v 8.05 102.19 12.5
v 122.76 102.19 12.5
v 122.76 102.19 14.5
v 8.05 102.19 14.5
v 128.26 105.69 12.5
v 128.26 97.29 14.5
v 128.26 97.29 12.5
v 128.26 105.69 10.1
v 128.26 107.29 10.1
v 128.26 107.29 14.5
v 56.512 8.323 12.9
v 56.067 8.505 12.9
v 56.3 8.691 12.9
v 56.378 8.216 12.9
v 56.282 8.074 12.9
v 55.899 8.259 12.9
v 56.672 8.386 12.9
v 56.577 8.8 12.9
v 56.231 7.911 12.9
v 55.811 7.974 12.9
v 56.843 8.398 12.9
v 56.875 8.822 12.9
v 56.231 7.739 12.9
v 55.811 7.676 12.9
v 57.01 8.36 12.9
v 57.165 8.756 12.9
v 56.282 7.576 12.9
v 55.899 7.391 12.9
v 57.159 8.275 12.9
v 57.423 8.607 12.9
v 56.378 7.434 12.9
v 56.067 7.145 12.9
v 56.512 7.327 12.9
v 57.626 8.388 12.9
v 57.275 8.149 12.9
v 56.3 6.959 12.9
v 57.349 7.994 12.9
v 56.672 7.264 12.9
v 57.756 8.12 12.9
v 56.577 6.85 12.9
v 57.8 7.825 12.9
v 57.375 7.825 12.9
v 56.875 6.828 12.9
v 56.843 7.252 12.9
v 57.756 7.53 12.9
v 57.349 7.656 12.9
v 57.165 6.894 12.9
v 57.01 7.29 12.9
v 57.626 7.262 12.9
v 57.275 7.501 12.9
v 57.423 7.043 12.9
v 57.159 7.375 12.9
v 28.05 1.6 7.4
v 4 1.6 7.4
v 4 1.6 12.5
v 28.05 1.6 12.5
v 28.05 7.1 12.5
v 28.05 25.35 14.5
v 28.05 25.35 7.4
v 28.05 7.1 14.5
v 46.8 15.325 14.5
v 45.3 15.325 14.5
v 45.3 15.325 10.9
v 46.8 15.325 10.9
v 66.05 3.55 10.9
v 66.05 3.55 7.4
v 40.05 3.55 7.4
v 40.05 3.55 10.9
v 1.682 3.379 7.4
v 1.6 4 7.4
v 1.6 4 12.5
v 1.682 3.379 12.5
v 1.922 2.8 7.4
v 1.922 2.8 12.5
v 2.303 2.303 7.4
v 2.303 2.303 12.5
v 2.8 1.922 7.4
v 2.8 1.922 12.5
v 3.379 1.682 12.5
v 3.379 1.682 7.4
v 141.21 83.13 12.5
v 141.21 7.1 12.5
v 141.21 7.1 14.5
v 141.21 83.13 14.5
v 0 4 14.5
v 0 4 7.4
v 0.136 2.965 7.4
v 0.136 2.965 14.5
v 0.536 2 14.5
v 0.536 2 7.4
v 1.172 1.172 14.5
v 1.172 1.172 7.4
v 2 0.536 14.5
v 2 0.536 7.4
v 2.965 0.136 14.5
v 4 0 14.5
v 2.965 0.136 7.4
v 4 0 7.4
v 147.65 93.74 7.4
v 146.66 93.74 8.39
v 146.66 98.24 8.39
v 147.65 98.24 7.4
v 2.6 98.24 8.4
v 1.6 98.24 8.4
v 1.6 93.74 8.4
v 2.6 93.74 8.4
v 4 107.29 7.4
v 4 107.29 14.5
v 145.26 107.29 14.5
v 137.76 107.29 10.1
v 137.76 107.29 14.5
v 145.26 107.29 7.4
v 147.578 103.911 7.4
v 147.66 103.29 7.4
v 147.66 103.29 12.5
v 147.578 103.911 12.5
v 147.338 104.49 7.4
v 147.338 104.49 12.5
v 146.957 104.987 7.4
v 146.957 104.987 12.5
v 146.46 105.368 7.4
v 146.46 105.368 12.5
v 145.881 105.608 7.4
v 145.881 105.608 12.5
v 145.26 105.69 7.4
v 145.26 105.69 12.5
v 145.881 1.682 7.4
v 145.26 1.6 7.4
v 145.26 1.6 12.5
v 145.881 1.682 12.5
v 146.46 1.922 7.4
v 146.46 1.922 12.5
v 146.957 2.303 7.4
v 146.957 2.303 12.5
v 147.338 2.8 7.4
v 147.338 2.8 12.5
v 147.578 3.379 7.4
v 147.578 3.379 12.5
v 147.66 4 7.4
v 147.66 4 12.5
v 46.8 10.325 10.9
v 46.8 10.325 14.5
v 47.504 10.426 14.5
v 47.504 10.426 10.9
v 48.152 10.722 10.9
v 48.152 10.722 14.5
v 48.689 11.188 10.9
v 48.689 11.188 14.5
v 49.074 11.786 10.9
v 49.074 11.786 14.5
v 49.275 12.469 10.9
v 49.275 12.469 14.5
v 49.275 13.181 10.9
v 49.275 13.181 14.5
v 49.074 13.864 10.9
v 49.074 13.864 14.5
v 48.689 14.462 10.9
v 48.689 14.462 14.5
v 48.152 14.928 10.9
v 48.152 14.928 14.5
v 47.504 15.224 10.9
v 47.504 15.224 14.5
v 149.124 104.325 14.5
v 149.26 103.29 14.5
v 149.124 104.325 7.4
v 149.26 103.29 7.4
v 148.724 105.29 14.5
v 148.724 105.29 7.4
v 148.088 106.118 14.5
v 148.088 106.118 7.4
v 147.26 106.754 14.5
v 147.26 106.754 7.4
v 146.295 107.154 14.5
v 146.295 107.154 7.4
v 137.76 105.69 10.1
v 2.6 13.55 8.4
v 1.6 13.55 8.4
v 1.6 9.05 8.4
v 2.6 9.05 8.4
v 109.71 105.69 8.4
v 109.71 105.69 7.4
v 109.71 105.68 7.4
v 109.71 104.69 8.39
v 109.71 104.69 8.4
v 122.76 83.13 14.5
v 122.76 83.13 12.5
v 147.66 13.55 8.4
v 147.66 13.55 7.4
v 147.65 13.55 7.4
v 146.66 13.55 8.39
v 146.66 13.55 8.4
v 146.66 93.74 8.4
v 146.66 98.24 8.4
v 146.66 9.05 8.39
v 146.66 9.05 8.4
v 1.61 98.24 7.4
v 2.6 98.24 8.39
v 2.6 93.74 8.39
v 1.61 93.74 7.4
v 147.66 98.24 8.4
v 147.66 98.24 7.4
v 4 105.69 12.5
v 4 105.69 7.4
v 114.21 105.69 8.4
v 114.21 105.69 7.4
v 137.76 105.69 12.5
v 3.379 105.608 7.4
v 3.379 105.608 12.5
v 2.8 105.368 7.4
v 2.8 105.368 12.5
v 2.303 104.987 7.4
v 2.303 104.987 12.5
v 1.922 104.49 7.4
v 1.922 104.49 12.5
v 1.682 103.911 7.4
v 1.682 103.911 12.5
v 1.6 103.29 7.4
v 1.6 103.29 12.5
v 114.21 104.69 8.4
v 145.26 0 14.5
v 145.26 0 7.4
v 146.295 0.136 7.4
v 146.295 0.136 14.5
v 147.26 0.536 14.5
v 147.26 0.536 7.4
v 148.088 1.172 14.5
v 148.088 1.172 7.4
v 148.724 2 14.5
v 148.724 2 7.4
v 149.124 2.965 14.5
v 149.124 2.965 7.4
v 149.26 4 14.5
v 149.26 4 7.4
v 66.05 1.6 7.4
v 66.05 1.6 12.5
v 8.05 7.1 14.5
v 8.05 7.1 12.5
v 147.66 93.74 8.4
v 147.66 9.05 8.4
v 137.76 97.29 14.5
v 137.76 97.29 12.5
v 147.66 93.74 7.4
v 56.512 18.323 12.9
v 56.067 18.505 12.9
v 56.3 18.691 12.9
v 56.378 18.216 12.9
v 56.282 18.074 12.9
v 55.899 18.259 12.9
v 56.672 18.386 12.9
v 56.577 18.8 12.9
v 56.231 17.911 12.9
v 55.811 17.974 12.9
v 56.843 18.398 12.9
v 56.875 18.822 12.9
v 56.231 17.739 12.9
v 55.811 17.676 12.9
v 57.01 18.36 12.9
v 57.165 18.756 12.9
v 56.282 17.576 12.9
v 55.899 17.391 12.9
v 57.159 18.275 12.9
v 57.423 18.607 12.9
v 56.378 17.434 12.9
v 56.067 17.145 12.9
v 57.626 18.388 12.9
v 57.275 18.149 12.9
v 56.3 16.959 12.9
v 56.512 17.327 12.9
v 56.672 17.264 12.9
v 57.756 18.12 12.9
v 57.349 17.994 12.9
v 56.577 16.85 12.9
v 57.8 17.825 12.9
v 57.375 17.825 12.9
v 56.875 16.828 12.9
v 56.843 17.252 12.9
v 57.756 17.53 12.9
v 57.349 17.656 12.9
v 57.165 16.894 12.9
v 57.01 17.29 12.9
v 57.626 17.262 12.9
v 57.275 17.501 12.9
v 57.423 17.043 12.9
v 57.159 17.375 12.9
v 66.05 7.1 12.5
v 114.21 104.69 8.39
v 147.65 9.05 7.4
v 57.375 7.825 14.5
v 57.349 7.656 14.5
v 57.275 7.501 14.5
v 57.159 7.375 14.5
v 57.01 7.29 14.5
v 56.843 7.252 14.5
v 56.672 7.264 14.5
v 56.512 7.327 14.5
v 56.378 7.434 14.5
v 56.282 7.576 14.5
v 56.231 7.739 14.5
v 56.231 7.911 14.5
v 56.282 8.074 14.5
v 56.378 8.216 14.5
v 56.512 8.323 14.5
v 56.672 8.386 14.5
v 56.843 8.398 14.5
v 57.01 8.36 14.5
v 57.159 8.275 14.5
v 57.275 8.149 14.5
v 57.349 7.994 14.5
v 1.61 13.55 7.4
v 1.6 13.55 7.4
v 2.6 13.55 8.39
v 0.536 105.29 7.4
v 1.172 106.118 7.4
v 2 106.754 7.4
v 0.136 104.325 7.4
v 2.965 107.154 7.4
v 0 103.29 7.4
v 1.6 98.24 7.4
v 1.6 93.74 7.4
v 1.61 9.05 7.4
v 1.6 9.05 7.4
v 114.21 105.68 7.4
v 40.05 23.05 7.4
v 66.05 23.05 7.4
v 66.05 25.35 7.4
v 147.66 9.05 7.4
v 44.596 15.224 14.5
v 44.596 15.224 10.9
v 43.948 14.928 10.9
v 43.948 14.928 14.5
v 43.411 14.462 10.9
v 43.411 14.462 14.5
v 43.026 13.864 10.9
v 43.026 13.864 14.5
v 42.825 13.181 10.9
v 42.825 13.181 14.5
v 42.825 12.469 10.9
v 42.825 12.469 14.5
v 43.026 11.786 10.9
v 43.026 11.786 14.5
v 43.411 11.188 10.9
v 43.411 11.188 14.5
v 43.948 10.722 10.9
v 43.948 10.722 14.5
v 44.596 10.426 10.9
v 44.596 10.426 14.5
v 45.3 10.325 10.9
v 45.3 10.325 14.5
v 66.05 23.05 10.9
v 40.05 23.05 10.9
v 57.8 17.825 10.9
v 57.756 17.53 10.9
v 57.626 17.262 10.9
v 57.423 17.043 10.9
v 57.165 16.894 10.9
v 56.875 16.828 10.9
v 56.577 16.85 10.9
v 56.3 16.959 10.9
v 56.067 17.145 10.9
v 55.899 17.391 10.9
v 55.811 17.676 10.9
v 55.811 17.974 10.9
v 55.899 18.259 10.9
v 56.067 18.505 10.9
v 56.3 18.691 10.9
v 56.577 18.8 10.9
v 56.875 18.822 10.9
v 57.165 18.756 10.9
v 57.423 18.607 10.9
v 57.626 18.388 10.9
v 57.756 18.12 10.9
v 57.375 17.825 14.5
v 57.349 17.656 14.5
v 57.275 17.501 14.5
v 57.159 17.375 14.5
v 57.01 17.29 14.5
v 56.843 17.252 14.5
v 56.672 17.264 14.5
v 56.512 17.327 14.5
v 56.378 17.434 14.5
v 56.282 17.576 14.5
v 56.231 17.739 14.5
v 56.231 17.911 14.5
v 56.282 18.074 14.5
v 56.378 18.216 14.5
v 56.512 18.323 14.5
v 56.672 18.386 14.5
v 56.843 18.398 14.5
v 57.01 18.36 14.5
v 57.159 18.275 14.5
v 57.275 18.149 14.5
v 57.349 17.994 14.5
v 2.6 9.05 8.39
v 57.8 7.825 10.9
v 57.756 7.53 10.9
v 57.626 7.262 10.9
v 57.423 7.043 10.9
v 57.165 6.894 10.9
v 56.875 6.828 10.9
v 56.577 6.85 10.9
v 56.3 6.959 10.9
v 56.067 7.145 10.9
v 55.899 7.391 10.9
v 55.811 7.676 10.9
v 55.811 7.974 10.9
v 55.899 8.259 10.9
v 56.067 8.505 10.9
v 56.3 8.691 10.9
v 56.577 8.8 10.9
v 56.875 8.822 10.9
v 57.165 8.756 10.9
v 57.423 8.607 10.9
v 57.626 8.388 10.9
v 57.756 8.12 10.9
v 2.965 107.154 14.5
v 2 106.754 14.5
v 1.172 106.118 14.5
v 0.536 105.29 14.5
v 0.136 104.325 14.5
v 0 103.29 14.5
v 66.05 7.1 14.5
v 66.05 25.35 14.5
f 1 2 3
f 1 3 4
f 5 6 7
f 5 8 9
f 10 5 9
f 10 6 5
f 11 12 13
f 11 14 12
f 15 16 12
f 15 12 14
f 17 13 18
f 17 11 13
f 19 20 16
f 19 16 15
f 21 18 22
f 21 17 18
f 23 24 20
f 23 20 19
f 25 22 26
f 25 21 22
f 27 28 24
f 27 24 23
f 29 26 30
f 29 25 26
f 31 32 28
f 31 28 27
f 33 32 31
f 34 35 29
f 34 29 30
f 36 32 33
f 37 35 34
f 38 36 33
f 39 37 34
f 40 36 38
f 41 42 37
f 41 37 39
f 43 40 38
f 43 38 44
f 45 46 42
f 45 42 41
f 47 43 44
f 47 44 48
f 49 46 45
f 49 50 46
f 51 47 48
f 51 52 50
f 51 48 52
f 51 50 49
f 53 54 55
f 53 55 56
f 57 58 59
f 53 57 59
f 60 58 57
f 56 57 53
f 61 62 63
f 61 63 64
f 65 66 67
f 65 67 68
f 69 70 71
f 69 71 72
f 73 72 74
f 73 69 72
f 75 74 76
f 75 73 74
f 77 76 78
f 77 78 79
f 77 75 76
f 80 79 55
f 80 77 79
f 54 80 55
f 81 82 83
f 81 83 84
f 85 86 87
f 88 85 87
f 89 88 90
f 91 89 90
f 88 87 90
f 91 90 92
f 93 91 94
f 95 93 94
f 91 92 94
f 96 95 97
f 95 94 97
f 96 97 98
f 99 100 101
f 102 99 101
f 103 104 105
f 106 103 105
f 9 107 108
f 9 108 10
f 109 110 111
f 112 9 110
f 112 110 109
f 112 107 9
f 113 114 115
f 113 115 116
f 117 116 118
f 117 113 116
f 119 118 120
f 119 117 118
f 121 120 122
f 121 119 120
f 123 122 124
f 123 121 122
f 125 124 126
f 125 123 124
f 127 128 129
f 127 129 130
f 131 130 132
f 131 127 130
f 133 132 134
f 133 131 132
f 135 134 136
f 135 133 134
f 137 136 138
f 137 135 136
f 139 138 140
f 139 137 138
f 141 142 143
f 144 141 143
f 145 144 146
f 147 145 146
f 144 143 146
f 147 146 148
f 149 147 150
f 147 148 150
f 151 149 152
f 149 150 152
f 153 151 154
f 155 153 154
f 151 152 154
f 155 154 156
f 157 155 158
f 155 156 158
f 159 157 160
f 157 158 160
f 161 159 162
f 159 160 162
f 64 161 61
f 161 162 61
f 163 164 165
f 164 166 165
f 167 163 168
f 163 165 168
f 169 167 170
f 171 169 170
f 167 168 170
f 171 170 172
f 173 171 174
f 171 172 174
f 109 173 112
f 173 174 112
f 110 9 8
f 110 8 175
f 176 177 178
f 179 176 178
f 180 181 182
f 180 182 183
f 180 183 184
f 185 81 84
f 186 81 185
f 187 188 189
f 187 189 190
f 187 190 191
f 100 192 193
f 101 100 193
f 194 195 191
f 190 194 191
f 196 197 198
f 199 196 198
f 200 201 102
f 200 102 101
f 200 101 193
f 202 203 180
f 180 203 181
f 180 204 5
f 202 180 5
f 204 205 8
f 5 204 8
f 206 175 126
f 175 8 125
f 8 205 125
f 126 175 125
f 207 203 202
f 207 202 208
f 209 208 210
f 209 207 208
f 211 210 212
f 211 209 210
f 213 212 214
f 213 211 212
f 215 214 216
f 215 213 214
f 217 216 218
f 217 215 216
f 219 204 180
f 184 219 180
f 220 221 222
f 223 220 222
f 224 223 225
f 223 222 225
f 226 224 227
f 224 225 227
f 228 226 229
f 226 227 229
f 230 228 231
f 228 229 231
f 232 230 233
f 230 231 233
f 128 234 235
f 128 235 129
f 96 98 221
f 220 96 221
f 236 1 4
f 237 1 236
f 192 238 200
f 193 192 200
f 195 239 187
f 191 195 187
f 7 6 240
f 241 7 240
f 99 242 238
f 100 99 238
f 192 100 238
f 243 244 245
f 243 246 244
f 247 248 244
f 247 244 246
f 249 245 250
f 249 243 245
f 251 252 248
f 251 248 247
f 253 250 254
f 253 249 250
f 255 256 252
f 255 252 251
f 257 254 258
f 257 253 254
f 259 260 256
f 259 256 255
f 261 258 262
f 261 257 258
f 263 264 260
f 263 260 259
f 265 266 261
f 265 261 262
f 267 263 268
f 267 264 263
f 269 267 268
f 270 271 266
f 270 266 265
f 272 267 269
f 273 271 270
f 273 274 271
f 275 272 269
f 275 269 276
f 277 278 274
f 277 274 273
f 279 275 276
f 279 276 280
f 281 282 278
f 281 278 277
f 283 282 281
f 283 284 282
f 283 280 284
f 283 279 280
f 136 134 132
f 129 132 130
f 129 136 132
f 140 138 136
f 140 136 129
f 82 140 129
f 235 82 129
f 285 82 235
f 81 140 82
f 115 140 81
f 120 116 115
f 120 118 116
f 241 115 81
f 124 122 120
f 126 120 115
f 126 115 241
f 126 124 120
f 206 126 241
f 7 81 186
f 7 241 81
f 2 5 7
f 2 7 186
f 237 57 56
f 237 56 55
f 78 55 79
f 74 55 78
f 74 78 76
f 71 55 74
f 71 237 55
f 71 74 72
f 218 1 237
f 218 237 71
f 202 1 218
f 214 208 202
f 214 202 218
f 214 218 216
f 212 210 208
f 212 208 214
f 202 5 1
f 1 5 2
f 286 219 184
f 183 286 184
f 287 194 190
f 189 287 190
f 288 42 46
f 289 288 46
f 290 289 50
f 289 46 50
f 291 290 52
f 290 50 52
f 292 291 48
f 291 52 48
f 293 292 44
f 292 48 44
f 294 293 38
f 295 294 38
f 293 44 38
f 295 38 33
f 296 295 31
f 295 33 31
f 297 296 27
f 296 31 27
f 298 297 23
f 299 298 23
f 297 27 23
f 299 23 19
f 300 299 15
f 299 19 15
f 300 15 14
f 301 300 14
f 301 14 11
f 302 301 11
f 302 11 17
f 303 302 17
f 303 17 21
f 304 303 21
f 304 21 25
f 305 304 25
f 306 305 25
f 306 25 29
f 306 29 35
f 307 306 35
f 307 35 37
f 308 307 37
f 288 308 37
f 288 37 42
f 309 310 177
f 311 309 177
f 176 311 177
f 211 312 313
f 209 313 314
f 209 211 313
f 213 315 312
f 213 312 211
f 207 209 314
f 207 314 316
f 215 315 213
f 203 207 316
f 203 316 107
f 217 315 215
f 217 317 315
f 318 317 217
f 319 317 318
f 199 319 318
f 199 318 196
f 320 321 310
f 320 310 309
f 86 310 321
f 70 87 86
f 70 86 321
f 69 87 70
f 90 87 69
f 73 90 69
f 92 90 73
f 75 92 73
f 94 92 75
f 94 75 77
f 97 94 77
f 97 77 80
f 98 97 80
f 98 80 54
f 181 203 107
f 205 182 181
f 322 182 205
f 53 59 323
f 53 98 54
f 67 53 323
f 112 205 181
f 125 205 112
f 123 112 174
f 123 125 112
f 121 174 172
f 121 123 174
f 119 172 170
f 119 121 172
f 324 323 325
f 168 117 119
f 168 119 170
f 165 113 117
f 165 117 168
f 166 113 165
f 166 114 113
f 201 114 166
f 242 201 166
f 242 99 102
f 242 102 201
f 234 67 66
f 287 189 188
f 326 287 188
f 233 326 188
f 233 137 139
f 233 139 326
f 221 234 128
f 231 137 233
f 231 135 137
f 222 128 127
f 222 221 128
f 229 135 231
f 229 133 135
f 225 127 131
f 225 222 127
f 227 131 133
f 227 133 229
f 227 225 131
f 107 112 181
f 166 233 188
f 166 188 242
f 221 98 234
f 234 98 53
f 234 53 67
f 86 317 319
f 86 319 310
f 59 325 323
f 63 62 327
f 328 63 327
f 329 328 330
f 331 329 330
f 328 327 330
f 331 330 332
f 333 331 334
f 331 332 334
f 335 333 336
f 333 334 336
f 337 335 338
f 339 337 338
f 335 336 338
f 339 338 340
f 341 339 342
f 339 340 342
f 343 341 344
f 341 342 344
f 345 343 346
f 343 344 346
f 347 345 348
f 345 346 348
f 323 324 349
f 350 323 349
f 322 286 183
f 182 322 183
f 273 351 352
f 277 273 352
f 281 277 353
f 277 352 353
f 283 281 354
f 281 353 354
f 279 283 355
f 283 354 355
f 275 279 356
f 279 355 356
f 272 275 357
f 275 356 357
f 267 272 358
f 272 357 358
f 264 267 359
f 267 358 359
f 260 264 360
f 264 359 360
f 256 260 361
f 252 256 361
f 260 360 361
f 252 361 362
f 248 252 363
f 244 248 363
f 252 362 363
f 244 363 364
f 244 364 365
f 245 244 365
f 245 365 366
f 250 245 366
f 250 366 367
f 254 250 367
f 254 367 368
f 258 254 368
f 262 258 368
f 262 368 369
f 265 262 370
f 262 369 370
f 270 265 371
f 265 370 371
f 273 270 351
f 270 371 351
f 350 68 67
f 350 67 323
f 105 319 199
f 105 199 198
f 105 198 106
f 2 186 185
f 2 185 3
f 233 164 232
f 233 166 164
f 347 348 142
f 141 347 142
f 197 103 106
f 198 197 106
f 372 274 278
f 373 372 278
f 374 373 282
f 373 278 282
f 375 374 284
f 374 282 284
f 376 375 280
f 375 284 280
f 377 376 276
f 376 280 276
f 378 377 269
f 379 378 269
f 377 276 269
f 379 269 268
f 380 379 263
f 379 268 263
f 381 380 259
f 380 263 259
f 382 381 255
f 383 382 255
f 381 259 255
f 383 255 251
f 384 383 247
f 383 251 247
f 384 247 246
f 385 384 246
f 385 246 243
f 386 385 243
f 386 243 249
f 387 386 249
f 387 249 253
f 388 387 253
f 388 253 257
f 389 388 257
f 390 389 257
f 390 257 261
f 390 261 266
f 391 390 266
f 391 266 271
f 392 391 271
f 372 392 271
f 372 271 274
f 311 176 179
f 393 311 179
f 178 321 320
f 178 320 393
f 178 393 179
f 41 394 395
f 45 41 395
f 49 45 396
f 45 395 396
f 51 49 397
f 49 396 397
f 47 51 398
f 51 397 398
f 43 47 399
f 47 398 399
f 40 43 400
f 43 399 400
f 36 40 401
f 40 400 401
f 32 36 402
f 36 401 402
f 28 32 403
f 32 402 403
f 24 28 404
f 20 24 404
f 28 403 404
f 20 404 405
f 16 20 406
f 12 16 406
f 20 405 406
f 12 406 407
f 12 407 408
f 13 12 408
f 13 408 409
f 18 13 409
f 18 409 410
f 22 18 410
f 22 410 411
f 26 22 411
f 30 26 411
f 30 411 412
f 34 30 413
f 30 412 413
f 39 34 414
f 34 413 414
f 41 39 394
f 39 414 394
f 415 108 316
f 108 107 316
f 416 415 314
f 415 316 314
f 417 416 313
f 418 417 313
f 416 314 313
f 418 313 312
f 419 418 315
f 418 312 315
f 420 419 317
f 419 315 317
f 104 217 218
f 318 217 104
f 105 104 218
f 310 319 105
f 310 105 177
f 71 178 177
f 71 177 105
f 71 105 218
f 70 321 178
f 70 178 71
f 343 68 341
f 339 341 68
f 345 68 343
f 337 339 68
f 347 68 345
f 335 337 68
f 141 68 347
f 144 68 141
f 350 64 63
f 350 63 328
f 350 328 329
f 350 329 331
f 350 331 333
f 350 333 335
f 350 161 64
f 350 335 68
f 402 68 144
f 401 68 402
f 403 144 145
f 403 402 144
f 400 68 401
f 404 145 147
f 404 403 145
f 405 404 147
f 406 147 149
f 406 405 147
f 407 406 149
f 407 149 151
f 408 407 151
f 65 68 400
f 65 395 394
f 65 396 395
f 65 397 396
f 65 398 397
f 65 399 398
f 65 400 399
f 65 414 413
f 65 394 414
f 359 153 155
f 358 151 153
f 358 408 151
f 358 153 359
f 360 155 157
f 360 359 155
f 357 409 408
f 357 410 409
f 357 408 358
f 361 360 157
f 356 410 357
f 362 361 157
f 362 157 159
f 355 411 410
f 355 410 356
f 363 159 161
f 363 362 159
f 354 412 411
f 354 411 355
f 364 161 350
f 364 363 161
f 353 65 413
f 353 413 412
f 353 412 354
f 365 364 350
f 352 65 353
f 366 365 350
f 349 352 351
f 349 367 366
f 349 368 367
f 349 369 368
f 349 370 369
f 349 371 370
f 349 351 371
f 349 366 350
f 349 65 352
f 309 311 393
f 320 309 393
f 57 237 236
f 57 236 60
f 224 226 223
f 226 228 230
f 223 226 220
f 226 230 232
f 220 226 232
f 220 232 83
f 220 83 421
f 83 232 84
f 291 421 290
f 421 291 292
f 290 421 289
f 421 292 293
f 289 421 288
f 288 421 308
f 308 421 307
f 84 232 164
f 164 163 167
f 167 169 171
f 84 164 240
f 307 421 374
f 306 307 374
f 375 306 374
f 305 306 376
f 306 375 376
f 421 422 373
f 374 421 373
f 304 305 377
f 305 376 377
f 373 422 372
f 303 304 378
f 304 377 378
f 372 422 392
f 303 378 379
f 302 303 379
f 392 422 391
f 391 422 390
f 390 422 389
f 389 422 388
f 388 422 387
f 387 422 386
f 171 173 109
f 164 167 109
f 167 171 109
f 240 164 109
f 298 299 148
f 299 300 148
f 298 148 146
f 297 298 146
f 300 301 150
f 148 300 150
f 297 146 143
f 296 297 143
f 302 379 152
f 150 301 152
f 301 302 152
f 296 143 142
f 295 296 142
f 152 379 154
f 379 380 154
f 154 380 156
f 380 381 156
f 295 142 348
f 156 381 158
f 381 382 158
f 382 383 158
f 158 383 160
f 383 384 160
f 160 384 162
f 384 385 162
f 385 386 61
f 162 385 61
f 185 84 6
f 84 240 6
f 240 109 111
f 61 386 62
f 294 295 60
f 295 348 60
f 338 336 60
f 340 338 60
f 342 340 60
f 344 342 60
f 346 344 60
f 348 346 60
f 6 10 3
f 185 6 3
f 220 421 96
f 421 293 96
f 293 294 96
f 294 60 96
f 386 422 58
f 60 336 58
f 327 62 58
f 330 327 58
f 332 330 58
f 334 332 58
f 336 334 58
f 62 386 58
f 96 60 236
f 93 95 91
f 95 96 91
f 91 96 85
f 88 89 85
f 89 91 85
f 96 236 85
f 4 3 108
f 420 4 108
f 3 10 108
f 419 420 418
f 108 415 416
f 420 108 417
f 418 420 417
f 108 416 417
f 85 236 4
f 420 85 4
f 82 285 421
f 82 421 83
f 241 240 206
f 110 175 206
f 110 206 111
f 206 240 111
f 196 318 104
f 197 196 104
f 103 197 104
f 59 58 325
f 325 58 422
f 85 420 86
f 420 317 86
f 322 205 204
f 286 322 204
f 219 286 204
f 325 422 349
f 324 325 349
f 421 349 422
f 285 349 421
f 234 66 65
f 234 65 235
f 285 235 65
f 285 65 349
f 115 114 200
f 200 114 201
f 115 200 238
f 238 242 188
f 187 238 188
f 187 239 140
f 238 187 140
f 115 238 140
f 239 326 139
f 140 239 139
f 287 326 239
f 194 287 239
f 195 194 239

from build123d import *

# Parameters (mm, degrees)
PAD006_DEPTH    = 5.1
PAD007_DEPTH    = 2
SKETCH012_W     = 19.5
SKETCH012_H     = 3.5
POCKET004_DEPTH = 26
POCKET005_DEPTH = 5
SKETCH014_R     = 0.575
POCKET006_DEPTH = 3.6
SKETCH015_R     = 1
POCKET007_DEPTH = 2
SKETCH016_W     = 4.5
SKETCH016_H     = 1
PAD008_DEPTH    = 1
CHAMFER_SIZE    = 0.99
SKETCH017_W     = 4.5
SKETCH017_H     = 1
PAD009_DEPTH    = 1
CHAMFER001_SIZE = 0.99
SKETCH018_W     = 9.5
SKETCH018_H     = 10
POCKET008_DEPTH = 4.4
SKETCH022_W     = 4.5
SKETCH022_H     = 1
PAD011_DEPTH    = 1
CHAMFER002_SIZE = 0.99
SKETCH023_W     = 10
SKETCH023_H     = 23.75
PAD012_DEPTH    = 5.1


with BuildPart() as part:
    # Sketch010 → Pad006 (new body)
    with BuildSketch(Plane.XY.offset(7.4)):
        with BuildLine():
            Line((149.259997, 103.29), (149.259997, 4))
            ThreePointArc((145.259999, 0), (148.088425, 1.171573), (149.259997, 4))
            Line((3.999999, 0), (145.259999, 0))
            ThreePointArc((0, 4), (1.171572, 1.171573), (3.999999, 0))
            Line((0, 103.29), (0, 4))
            ThreePointArc((3.999997, 107.29), (1.171572, 106.118426), (0, 103.29))
            Line((3.999997, 107.29), (145.259997, 107.29))
            ThreePointArc((149.259997, 103.29), (148.088425, 106.118427), (145.259997, 107.29))
        make_face()
        with BuildLine():
            Line((3.999997, 105.69), (145.259997, 105.69))
            ThreePointArc((147.659997, 103.29), (146.957054, 104.987056), (145.259997, 105.69))
            Line((147.659997, 103.29), (147.659997, 4))
            ThreePointArc((145.259999, 1.6), (146.957054, 2.302944), (147.659997, 4))
            Line((66.05, 1.6), (145.259999, 1.6))
            Line((66.05, 1.6), (66.05, 25.35))
            Line((66.05, 25.35), (38.05, 25.35))
            Line((38.05, 25.35), (38.05, 1.6))
            Line((4, 1.6), (38.05, 1.6))
            ThreePointArc((1.6, 4), (2.302944, 2.302944), (4, 1.6))
            Line((1.6, 103.29), (1.6, 4))
            ThreePointArc((3.999997, 105.69), (2.302943, 104.987055), (1.6, 103.29))
        make_face(mode=Mode.SUBTRACT)
    extrude(amount=PAD006_DEPTH)

    # Sketch011 (on Face22 of Pad006) → Pad007 (join)
    with BuildSketch(Plane.XY.offset(12.5)):
        with BuildLine():
            Line((149.259997, 103.29), (149.259997, 4))
            ThreePointArc((145.259999, 0), (148.088425, 1.171573), (149.259997, 4))
            Line((3.999999, 0), (145.259999, 0))
            ThreePointArc((0, 4), (1.171572, 1.171573), (3.999999, 0))
            Line((0, 103.29), (0, 4))
            ThreePointArc((3.999997, 107.29), (1.171572, 106.118426), (0, 103.29))
            Line((3.999997, 107.29), (145.259997, 107.29))
            ThreePointArc((149.259997, 103.29), (148.088425, 106.118427), (145.259997, 107.29))
        make_face()
        Polygon((8.05, 102.19), (8.05, 7.1), (28.05, 7.1), (28.05, 25.35), (66.05, 25.35), (66.05, 7.1), (141.209997, 7.1), (141.209997, 83.13), (122.759997, 83.13), (122.759997, 102.19), align=None, mode=Mode.SUBTRACT)
    extrude(amount=PAD007_DEPTH)

    # Sketch012 (on Face26 of Pad007) → Pocket004 (cut)
    with BuildSketch(Plane.YZ.offset(66.05)):
        with Locations((13.3, 9.15)):
            Rectangle(SKETCH012_W, SKETCH012_H)
    extrude(amount=-POCKET004_DEPTH, mode=Mode.SUBTRACT)

    # Sketch013 (on Face25 of Pocket004) → Pocket005 (cut)
    with BuildSketch(Plane.XY.offset(14.5)):
        with BuildLine():
            ThreePointArc((45.3, 15.325), (42.8, 12.825), (45.3, 10.325))
            Line((45.3, 10.325), (46.8, 10.325))
            ThreePointArc((46.8, 10.325), (49.3, 12.825), (46.8, 15.325))
            Line((45.3, 15.325), (46.8, 15.325))
        make_face()
    extrude(amount=-POCKET005_DEPTH, mode=Mode.SUBTRACT)

    # Sketch014 (on Face29 of Pocket005) → Pocket006 (cut)
    with BuildSketch(Plane(origin=(0, 0, 10.9), x_dir=(1, 0, 0), z_dir=(0, 0, -1))):
        with Locations((56.8, -7.825)):
            Circle(SKETCH014_R)
        with Locations((56.8, -17.825)):
            Circle(SKETCH014_R)
    extrude(amount=-POCKET006_DEPTH, mode=Mode.SUBTRACT)

    # Sketch015 (on Face29 of Pocket006) → Pocket007 (cut)
    with BuildSketch(Plane(origin=(0, 0, 10.9), x_dir=(1, 0, 0), z_dir=(0, 0, -1))):
        with Locations((56.8, -17.825)):
            Circle(SKETCH015_R)
        with Locations((56.8, -7.825)):
            Circle(SKETCH015_R)
    extrude(amount=-POCKET007_DEPTH, mode=Mode.SUBTRACT)

    # Sketch016 (on Face6 of Pocket007) → Pad008 (join)
    with BuildSketch(Plane.YZ.offset(147.659997)):
        with Locations((11.3, 7.9)):
            Rectangle(SKETCH016_W, SKETCH016_H)
        with Locations((95.99, 7.9)):
            Rectangle(SKETCH016_W, SKETCH016_H)
    extrude(amount=-PAD008_DEPTH)

    # Chamfer
    chamfer_edges = [part.edges().sort_by_distance(p)[0] for p in [
        (146.659997, 11.3, 7.4),
        (146.659997, 95.99, 7.4),
    ]]
    chamfer(chamfer_edges, length=CHAMFER_SIZE)

    # Sketch017 (on Face31 of Chamfer) → Pad009 (join)
    with BuildSketch(Plane(origin=(1.6, 0, 0), x_dir=(0, -1, 0), z_dir=(-1, 0, 0))):
        with Locations((-95.99, 7.9)):
            Rectangle(SKETCH017_W, SKETCH017_H)
        with Locations((-11.3, 7.9)):
            Rectangle(SKETCH017_W, SKETCH017_H)
    extrude(amount=-PAD009_DEPTH)

    # Chamfer001
    chamfer001_edges = [part.edges().sort_by_distance(p)[0] for p in [
        (2.6, 95.99, 7.4),
        (2.6, 11.3, 7.4),
    ]]
    chamfer(chamfer001_edges, length=CHAMFER001_SIZE)

    # Sketch018 (on Face47 of Chamfer001) → Pocket008 (cut)
    with BuildSketch(Plane.XY.offset(14.5)):
        with Locations((133.009997, 102.29)):
            Rectangle(SKETCH018_W, SKETCH018_H)
    extrude(amount=-POCKET008_DEPTH, mode=Mode.SUBTRACT)

    # Sketch022 (on Face31 of Pocket008) → Pad011 (join)
    with BuildSketch(Plane(origin=(0, 105.69, 0), x_dir=(-1, 0, 0), z_dir=(0, 1, 0))):
        with Locations((-111.959997, 7.9)):
            Rectangle(SKETCH022_W, SKETCH022_H)
    extrude(amount=-PAD011_DEPTH)

    # Chamfer002
    chamfer002_edges = [part.edges().sort_by_distance(p)[0] for p in [
        (111.959997, 104.69, 7.4),
    ]]
    chamfer(chamfer002_edges, length=CHAMFER002_SIZE)

    # Sketch023 (on Face42 of Chamfer002) → Pad012 (join)
    with BuildSketch(Plane(origin=(0, 0, 12.5), x_dir=(1, 0, 0), z_dir=(0, 0, -1))):
        with Locations((33.05, -13.475)):
            Rectangle(SKETCH023_W, SKETCH023_H)
    extrude(amount=PAD012_DEPTH)


solid = part.part
